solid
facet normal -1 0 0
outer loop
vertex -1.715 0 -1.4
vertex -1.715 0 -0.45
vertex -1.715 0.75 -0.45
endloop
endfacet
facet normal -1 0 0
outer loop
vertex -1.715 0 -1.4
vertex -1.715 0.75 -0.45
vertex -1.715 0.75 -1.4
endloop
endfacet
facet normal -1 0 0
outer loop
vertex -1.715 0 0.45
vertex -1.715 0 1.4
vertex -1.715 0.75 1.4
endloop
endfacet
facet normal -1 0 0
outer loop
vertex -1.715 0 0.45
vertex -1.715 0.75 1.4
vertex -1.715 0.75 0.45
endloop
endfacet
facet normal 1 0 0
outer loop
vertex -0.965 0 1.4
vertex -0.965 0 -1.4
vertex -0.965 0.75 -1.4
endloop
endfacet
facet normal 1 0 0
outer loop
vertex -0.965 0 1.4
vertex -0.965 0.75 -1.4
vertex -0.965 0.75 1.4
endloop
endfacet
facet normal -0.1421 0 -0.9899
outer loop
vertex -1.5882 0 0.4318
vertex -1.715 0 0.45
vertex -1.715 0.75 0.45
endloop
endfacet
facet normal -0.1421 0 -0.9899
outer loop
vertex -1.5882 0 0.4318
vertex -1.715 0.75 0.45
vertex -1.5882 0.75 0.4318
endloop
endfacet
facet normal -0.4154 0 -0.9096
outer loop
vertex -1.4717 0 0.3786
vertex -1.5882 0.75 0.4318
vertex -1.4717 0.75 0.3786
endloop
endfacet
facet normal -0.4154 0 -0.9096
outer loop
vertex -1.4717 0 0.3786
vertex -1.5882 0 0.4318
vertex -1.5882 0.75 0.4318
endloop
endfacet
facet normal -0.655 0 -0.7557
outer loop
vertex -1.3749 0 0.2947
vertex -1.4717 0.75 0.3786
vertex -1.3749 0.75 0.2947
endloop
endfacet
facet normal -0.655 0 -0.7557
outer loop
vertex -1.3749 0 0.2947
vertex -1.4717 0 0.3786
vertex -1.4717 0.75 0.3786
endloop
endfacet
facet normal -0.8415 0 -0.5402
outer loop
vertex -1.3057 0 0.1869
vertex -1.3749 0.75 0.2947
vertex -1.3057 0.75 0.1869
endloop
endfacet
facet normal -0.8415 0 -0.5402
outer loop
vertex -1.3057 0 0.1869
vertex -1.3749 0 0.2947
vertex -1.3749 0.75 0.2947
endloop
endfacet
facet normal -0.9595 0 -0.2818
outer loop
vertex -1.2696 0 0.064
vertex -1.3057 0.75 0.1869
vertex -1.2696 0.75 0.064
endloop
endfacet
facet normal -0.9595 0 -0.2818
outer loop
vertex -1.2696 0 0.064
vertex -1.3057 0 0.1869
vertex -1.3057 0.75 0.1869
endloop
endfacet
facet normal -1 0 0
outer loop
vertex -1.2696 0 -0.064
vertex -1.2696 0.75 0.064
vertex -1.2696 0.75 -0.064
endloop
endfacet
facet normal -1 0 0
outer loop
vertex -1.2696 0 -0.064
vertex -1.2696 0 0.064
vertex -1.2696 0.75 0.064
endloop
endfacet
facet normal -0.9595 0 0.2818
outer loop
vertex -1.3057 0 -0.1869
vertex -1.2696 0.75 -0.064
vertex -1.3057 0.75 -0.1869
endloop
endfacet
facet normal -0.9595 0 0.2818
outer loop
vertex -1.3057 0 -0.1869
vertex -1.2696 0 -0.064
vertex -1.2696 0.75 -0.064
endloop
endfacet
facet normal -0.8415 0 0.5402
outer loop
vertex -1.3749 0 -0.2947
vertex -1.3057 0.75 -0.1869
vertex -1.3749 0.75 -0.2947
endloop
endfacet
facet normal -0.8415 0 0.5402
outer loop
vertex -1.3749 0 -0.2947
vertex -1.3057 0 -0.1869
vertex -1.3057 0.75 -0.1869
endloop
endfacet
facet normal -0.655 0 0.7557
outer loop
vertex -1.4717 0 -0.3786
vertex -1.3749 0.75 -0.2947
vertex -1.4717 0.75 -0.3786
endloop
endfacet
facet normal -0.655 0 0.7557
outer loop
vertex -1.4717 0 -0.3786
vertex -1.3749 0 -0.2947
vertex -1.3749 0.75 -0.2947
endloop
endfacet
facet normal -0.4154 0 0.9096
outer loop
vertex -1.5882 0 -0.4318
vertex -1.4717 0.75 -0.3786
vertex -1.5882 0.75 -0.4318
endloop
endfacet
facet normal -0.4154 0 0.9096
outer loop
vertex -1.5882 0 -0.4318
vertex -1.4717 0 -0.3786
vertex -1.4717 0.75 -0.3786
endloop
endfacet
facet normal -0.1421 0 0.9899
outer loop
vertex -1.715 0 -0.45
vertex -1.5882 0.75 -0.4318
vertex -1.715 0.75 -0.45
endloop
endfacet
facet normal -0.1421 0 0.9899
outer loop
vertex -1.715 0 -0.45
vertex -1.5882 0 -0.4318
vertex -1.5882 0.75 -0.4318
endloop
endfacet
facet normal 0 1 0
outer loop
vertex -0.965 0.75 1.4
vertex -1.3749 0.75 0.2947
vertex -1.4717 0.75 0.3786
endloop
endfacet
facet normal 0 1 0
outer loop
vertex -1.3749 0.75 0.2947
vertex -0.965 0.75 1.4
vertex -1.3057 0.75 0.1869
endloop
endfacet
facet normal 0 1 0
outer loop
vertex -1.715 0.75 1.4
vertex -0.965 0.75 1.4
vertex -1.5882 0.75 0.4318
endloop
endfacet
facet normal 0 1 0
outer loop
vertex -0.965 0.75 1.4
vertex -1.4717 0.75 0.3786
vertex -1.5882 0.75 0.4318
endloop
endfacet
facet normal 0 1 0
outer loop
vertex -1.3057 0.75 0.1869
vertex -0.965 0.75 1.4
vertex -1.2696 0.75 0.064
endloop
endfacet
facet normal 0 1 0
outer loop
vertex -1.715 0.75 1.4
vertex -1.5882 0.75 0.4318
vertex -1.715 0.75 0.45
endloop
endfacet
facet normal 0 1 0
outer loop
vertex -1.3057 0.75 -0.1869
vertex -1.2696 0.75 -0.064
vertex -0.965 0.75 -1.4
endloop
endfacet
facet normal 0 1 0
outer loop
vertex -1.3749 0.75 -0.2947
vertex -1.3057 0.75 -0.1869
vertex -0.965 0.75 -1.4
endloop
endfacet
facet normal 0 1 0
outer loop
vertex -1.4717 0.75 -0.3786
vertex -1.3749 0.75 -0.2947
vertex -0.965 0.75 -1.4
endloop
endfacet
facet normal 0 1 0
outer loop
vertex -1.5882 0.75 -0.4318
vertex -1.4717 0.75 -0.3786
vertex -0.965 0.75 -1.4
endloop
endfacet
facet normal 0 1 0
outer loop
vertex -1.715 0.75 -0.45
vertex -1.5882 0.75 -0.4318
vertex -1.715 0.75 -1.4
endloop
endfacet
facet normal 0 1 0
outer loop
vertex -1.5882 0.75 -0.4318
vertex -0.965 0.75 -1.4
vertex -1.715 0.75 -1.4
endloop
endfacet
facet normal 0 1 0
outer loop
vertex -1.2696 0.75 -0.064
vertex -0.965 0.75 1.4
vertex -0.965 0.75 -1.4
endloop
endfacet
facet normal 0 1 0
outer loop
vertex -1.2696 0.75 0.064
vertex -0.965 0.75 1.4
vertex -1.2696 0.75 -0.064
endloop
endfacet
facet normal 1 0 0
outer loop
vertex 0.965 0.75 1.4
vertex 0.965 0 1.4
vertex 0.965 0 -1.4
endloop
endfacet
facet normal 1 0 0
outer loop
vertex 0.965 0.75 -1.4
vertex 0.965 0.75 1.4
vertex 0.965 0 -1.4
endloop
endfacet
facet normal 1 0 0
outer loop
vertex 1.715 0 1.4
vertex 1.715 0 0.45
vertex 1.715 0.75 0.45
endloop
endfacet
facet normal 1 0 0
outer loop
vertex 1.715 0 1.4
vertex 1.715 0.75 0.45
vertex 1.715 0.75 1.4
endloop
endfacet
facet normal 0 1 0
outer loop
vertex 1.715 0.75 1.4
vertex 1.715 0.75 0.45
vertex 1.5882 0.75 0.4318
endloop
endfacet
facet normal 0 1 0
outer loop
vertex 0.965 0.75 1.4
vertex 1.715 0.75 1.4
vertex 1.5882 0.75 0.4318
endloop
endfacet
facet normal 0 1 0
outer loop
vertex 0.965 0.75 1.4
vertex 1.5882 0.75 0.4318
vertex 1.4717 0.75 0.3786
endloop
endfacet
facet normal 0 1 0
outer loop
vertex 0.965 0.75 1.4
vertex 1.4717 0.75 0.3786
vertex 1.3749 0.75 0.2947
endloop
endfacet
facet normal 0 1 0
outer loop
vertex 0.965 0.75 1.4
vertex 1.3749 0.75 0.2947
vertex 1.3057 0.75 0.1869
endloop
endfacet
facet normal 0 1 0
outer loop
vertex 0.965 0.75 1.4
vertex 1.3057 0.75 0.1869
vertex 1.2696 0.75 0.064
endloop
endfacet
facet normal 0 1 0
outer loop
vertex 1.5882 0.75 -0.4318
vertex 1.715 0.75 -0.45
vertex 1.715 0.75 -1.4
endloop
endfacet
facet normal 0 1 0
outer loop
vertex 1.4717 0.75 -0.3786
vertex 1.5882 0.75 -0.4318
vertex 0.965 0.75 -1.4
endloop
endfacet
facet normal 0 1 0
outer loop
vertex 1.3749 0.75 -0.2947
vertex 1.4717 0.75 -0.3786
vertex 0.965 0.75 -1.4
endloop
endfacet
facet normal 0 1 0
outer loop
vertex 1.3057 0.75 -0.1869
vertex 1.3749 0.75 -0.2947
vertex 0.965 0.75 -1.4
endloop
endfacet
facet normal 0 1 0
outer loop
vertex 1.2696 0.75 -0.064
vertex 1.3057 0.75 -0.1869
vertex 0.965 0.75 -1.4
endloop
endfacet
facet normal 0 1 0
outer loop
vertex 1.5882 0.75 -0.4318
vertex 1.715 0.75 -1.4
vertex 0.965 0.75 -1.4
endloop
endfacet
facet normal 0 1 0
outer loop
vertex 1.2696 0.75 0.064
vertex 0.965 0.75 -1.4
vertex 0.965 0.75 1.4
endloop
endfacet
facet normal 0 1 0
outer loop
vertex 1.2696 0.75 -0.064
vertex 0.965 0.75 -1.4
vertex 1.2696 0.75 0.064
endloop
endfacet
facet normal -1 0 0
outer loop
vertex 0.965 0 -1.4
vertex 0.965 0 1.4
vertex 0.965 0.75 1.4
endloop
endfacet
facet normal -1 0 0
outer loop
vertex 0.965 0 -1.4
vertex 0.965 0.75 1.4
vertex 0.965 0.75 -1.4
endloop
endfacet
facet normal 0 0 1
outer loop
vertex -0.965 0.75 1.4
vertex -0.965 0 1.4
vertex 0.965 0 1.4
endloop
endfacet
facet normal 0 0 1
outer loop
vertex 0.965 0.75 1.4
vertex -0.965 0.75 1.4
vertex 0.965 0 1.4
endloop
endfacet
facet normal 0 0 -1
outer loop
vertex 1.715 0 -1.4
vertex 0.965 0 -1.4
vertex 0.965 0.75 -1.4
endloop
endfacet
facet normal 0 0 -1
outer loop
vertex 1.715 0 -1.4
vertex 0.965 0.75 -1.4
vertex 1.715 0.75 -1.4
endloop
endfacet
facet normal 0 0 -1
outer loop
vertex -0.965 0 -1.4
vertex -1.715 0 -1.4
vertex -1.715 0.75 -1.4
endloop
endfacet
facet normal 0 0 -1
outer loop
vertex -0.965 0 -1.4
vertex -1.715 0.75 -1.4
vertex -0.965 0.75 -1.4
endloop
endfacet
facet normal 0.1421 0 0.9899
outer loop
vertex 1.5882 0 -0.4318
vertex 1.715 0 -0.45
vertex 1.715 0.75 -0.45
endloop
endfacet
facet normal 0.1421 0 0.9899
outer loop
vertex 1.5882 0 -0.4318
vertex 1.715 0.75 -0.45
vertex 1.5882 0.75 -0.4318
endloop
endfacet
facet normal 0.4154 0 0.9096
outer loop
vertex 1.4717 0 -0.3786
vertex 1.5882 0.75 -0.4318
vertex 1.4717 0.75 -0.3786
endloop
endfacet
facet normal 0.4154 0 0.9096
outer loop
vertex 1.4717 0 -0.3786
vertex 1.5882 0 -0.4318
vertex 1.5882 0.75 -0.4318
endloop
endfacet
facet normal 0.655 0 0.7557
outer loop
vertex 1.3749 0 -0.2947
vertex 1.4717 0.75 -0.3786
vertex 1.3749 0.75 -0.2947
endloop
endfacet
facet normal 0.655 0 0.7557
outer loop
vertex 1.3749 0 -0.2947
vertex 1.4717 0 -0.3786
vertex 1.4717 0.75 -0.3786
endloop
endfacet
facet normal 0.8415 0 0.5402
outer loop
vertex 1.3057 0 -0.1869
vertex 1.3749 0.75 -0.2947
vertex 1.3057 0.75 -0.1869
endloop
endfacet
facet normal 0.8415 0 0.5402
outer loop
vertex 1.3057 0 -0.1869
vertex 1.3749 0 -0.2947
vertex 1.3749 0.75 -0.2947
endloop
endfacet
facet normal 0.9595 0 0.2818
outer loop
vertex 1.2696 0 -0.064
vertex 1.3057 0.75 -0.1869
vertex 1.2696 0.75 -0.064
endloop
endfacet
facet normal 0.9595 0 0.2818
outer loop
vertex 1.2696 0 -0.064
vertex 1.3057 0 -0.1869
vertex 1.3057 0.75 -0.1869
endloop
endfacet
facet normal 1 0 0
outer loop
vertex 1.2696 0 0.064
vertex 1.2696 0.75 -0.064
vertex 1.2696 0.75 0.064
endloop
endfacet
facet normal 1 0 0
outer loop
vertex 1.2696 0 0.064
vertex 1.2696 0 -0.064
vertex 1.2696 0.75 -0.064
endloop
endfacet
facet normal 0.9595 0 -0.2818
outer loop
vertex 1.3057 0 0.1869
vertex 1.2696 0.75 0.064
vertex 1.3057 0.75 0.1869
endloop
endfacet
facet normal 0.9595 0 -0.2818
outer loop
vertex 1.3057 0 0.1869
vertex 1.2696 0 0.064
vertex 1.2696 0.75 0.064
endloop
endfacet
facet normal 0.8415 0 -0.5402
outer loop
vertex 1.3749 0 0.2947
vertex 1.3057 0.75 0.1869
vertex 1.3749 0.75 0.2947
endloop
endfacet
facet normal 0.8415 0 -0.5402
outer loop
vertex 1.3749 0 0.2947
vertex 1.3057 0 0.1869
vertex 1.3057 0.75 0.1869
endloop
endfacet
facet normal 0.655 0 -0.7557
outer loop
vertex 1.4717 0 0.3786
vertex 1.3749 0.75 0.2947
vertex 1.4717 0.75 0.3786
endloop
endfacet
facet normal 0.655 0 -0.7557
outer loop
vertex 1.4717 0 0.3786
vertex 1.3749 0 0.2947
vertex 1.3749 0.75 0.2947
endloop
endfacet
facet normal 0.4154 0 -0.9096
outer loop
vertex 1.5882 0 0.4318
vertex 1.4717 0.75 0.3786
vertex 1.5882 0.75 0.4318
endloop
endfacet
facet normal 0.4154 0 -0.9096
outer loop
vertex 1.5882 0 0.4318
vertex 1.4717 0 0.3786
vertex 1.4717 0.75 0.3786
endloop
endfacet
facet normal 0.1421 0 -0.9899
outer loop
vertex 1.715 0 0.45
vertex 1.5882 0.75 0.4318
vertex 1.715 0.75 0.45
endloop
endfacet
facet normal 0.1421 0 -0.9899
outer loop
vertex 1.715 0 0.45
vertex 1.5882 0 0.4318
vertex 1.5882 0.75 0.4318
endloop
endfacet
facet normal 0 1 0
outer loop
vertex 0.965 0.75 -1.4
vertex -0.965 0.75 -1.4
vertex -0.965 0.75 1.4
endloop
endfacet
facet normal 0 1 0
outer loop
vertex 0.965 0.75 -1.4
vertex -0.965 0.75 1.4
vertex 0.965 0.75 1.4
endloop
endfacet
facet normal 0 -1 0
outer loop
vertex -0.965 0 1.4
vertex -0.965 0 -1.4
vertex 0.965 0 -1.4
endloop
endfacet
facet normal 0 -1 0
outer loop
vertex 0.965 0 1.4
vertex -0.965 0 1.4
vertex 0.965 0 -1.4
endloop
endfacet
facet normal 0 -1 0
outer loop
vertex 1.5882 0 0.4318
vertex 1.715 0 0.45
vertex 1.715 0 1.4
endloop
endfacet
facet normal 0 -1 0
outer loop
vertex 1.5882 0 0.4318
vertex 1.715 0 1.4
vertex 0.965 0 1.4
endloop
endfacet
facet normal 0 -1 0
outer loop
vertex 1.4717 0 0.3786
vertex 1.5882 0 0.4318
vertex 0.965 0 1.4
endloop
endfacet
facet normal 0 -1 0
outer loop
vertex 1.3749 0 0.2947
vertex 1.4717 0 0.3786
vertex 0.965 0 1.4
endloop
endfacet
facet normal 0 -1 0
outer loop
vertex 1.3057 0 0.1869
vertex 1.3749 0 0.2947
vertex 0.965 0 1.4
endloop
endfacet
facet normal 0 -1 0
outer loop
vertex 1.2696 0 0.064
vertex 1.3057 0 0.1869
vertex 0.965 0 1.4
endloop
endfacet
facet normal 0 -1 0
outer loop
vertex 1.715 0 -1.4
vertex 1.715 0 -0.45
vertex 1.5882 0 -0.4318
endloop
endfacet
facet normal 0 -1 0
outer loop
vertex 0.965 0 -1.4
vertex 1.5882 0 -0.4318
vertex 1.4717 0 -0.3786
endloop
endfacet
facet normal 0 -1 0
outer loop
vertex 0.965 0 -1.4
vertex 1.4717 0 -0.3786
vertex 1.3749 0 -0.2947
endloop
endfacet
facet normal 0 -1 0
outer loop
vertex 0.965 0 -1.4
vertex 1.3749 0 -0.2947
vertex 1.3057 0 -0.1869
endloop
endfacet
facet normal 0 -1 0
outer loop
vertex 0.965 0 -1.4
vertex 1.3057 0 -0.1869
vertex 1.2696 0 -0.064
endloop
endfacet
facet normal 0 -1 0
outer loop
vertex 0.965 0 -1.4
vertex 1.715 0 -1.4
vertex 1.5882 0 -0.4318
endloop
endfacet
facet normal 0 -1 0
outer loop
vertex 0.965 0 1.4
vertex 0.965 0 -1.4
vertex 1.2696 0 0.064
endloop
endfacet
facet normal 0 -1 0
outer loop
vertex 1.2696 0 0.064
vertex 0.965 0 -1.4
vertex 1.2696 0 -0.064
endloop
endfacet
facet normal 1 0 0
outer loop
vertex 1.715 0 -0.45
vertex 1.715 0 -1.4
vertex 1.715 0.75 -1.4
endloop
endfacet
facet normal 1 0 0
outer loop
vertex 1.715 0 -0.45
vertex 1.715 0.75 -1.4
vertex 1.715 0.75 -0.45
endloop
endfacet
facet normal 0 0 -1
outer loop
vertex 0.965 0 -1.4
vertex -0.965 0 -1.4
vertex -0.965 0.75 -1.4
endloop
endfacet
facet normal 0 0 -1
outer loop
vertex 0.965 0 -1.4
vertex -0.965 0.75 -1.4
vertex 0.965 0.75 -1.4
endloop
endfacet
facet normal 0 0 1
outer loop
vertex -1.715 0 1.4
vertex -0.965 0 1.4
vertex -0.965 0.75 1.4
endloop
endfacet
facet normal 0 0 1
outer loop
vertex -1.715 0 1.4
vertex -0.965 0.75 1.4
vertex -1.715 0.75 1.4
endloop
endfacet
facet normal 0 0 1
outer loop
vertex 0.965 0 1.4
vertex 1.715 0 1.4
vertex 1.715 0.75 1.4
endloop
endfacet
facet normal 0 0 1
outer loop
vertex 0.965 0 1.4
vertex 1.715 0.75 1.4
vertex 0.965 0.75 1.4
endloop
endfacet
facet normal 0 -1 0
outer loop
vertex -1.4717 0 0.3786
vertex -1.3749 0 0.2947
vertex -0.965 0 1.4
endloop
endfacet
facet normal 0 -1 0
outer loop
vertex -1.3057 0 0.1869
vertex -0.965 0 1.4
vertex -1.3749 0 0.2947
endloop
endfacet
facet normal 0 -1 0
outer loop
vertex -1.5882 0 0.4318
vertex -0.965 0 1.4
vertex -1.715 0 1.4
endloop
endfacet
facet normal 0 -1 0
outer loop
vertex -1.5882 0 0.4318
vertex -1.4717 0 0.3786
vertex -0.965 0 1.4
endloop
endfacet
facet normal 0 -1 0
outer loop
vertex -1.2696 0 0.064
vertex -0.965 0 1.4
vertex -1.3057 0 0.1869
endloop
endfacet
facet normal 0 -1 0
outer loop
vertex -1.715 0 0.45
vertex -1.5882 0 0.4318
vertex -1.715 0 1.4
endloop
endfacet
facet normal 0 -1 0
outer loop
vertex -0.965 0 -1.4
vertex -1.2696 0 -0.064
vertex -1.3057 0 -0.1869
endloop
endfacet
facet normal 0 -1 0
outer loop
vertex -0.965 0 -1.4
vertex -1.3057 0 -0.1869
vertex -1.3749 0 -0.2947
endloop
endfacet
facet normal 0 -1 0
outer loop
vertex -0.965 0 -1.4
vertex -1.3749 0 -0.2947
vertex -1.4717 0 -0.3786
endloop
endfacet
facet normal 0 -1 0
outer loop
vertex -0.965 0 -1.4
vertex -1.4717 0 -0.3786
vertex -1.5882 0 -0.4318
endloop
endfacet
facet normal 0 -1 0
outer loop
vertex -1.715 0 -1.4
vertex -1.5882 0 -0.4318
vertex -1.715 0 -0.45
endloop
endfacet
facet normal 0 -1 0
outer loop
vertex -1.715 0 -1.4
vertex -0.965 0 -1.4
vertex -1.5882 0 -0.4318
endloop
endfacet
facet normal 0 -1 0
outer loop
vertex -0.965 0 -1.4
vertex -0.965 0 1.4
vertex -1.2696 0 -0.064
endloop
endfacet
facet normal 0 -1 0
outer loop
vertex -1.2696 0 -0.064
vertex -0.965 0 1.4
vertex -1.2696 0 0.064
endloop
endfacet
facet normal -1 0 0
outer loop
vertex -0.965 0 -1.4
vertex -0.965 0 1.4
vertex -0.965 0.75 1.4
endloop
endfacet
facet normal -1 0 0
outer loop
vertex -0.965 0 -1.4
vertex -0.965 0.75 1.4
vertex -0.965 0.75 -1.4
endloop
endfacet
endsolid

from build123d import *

# Parameters (mm, degrees)
SKETCH1_W             = 1.93
SKETCH1_H             = 2.8
BOSS_EXTRUDE1_DEPTH   = 0.75
BOSS_EXTRUDE3_DEPTH   = 0.75
BOSS_EXTRUDE3_2_DEPTH = 0.75


with BuildPart() as part:
    # Sketch1 → Boss-Extrude1 (new body)
    with BuildSketch(Plane(origin=(0, 0, 0), x_dir=(1, 0, 0), z_dir=(0, 1, 0))):
        Rectangle(SKETCH1_W, SKETCH1_H)
    extrude(amount=BOSS_EXTRUDE1_DEPTH)


with BuildPart() as body_2:
    # Sketch2 → Boss-Extrude3 (new body)
    with BuildSketch(Plane(origin=(0, 0, 0), x_dir=(1, 0, 0), z_dir=(0, 1, 0))):
        with BuildLine():
            Line((1.715, -0.45), (1.715, -1.4))
            Line((1.715, -1.4), (0.965, -1.4))
            Line((0.965, -1.4), (0.965, 1.4))
            Line((0.965, 1.4), (1.715, 1.4))
            Line((1.715, 1.4), (1.715, 0.45))
            ThreePointArc((1.715, 0.45), (1.265, 0), (1.715, -0.45))
        make_face()
    extrude(amount=BOSS_EXTRUDE3_DEPTH)


with BuildPart() as body_3:
    # Sketch2 → Boss-Extrude3 2 (new body)
    with BuildSketch(Plane(origin=(0, 0, 0), x_dir=(1, 0, 0), z_dir=(0, 1, 0))):
        with BuildLine():
            Line((-0.965, 1.4), (-0.965, -1.4))
            Line((-0.965, -1.4), (-1.715, -1.4))
            Line((-1.715, -1.4), (-1.715, -0.45))
            ThreePointArc((-1.715, -0.45), (-1.265, 0), (-1.715, 0.45))
            Line((-1.715, 0.45), (-1.715, 1.4))
            Line((-1.715, 1.4), (-0.965, 1.4))
        make_face()
    extrude(amount=BOSS_EXTRUDE3_2_DEPTH)


solid = Compound([part.part, body_2.part, body_3.part])
